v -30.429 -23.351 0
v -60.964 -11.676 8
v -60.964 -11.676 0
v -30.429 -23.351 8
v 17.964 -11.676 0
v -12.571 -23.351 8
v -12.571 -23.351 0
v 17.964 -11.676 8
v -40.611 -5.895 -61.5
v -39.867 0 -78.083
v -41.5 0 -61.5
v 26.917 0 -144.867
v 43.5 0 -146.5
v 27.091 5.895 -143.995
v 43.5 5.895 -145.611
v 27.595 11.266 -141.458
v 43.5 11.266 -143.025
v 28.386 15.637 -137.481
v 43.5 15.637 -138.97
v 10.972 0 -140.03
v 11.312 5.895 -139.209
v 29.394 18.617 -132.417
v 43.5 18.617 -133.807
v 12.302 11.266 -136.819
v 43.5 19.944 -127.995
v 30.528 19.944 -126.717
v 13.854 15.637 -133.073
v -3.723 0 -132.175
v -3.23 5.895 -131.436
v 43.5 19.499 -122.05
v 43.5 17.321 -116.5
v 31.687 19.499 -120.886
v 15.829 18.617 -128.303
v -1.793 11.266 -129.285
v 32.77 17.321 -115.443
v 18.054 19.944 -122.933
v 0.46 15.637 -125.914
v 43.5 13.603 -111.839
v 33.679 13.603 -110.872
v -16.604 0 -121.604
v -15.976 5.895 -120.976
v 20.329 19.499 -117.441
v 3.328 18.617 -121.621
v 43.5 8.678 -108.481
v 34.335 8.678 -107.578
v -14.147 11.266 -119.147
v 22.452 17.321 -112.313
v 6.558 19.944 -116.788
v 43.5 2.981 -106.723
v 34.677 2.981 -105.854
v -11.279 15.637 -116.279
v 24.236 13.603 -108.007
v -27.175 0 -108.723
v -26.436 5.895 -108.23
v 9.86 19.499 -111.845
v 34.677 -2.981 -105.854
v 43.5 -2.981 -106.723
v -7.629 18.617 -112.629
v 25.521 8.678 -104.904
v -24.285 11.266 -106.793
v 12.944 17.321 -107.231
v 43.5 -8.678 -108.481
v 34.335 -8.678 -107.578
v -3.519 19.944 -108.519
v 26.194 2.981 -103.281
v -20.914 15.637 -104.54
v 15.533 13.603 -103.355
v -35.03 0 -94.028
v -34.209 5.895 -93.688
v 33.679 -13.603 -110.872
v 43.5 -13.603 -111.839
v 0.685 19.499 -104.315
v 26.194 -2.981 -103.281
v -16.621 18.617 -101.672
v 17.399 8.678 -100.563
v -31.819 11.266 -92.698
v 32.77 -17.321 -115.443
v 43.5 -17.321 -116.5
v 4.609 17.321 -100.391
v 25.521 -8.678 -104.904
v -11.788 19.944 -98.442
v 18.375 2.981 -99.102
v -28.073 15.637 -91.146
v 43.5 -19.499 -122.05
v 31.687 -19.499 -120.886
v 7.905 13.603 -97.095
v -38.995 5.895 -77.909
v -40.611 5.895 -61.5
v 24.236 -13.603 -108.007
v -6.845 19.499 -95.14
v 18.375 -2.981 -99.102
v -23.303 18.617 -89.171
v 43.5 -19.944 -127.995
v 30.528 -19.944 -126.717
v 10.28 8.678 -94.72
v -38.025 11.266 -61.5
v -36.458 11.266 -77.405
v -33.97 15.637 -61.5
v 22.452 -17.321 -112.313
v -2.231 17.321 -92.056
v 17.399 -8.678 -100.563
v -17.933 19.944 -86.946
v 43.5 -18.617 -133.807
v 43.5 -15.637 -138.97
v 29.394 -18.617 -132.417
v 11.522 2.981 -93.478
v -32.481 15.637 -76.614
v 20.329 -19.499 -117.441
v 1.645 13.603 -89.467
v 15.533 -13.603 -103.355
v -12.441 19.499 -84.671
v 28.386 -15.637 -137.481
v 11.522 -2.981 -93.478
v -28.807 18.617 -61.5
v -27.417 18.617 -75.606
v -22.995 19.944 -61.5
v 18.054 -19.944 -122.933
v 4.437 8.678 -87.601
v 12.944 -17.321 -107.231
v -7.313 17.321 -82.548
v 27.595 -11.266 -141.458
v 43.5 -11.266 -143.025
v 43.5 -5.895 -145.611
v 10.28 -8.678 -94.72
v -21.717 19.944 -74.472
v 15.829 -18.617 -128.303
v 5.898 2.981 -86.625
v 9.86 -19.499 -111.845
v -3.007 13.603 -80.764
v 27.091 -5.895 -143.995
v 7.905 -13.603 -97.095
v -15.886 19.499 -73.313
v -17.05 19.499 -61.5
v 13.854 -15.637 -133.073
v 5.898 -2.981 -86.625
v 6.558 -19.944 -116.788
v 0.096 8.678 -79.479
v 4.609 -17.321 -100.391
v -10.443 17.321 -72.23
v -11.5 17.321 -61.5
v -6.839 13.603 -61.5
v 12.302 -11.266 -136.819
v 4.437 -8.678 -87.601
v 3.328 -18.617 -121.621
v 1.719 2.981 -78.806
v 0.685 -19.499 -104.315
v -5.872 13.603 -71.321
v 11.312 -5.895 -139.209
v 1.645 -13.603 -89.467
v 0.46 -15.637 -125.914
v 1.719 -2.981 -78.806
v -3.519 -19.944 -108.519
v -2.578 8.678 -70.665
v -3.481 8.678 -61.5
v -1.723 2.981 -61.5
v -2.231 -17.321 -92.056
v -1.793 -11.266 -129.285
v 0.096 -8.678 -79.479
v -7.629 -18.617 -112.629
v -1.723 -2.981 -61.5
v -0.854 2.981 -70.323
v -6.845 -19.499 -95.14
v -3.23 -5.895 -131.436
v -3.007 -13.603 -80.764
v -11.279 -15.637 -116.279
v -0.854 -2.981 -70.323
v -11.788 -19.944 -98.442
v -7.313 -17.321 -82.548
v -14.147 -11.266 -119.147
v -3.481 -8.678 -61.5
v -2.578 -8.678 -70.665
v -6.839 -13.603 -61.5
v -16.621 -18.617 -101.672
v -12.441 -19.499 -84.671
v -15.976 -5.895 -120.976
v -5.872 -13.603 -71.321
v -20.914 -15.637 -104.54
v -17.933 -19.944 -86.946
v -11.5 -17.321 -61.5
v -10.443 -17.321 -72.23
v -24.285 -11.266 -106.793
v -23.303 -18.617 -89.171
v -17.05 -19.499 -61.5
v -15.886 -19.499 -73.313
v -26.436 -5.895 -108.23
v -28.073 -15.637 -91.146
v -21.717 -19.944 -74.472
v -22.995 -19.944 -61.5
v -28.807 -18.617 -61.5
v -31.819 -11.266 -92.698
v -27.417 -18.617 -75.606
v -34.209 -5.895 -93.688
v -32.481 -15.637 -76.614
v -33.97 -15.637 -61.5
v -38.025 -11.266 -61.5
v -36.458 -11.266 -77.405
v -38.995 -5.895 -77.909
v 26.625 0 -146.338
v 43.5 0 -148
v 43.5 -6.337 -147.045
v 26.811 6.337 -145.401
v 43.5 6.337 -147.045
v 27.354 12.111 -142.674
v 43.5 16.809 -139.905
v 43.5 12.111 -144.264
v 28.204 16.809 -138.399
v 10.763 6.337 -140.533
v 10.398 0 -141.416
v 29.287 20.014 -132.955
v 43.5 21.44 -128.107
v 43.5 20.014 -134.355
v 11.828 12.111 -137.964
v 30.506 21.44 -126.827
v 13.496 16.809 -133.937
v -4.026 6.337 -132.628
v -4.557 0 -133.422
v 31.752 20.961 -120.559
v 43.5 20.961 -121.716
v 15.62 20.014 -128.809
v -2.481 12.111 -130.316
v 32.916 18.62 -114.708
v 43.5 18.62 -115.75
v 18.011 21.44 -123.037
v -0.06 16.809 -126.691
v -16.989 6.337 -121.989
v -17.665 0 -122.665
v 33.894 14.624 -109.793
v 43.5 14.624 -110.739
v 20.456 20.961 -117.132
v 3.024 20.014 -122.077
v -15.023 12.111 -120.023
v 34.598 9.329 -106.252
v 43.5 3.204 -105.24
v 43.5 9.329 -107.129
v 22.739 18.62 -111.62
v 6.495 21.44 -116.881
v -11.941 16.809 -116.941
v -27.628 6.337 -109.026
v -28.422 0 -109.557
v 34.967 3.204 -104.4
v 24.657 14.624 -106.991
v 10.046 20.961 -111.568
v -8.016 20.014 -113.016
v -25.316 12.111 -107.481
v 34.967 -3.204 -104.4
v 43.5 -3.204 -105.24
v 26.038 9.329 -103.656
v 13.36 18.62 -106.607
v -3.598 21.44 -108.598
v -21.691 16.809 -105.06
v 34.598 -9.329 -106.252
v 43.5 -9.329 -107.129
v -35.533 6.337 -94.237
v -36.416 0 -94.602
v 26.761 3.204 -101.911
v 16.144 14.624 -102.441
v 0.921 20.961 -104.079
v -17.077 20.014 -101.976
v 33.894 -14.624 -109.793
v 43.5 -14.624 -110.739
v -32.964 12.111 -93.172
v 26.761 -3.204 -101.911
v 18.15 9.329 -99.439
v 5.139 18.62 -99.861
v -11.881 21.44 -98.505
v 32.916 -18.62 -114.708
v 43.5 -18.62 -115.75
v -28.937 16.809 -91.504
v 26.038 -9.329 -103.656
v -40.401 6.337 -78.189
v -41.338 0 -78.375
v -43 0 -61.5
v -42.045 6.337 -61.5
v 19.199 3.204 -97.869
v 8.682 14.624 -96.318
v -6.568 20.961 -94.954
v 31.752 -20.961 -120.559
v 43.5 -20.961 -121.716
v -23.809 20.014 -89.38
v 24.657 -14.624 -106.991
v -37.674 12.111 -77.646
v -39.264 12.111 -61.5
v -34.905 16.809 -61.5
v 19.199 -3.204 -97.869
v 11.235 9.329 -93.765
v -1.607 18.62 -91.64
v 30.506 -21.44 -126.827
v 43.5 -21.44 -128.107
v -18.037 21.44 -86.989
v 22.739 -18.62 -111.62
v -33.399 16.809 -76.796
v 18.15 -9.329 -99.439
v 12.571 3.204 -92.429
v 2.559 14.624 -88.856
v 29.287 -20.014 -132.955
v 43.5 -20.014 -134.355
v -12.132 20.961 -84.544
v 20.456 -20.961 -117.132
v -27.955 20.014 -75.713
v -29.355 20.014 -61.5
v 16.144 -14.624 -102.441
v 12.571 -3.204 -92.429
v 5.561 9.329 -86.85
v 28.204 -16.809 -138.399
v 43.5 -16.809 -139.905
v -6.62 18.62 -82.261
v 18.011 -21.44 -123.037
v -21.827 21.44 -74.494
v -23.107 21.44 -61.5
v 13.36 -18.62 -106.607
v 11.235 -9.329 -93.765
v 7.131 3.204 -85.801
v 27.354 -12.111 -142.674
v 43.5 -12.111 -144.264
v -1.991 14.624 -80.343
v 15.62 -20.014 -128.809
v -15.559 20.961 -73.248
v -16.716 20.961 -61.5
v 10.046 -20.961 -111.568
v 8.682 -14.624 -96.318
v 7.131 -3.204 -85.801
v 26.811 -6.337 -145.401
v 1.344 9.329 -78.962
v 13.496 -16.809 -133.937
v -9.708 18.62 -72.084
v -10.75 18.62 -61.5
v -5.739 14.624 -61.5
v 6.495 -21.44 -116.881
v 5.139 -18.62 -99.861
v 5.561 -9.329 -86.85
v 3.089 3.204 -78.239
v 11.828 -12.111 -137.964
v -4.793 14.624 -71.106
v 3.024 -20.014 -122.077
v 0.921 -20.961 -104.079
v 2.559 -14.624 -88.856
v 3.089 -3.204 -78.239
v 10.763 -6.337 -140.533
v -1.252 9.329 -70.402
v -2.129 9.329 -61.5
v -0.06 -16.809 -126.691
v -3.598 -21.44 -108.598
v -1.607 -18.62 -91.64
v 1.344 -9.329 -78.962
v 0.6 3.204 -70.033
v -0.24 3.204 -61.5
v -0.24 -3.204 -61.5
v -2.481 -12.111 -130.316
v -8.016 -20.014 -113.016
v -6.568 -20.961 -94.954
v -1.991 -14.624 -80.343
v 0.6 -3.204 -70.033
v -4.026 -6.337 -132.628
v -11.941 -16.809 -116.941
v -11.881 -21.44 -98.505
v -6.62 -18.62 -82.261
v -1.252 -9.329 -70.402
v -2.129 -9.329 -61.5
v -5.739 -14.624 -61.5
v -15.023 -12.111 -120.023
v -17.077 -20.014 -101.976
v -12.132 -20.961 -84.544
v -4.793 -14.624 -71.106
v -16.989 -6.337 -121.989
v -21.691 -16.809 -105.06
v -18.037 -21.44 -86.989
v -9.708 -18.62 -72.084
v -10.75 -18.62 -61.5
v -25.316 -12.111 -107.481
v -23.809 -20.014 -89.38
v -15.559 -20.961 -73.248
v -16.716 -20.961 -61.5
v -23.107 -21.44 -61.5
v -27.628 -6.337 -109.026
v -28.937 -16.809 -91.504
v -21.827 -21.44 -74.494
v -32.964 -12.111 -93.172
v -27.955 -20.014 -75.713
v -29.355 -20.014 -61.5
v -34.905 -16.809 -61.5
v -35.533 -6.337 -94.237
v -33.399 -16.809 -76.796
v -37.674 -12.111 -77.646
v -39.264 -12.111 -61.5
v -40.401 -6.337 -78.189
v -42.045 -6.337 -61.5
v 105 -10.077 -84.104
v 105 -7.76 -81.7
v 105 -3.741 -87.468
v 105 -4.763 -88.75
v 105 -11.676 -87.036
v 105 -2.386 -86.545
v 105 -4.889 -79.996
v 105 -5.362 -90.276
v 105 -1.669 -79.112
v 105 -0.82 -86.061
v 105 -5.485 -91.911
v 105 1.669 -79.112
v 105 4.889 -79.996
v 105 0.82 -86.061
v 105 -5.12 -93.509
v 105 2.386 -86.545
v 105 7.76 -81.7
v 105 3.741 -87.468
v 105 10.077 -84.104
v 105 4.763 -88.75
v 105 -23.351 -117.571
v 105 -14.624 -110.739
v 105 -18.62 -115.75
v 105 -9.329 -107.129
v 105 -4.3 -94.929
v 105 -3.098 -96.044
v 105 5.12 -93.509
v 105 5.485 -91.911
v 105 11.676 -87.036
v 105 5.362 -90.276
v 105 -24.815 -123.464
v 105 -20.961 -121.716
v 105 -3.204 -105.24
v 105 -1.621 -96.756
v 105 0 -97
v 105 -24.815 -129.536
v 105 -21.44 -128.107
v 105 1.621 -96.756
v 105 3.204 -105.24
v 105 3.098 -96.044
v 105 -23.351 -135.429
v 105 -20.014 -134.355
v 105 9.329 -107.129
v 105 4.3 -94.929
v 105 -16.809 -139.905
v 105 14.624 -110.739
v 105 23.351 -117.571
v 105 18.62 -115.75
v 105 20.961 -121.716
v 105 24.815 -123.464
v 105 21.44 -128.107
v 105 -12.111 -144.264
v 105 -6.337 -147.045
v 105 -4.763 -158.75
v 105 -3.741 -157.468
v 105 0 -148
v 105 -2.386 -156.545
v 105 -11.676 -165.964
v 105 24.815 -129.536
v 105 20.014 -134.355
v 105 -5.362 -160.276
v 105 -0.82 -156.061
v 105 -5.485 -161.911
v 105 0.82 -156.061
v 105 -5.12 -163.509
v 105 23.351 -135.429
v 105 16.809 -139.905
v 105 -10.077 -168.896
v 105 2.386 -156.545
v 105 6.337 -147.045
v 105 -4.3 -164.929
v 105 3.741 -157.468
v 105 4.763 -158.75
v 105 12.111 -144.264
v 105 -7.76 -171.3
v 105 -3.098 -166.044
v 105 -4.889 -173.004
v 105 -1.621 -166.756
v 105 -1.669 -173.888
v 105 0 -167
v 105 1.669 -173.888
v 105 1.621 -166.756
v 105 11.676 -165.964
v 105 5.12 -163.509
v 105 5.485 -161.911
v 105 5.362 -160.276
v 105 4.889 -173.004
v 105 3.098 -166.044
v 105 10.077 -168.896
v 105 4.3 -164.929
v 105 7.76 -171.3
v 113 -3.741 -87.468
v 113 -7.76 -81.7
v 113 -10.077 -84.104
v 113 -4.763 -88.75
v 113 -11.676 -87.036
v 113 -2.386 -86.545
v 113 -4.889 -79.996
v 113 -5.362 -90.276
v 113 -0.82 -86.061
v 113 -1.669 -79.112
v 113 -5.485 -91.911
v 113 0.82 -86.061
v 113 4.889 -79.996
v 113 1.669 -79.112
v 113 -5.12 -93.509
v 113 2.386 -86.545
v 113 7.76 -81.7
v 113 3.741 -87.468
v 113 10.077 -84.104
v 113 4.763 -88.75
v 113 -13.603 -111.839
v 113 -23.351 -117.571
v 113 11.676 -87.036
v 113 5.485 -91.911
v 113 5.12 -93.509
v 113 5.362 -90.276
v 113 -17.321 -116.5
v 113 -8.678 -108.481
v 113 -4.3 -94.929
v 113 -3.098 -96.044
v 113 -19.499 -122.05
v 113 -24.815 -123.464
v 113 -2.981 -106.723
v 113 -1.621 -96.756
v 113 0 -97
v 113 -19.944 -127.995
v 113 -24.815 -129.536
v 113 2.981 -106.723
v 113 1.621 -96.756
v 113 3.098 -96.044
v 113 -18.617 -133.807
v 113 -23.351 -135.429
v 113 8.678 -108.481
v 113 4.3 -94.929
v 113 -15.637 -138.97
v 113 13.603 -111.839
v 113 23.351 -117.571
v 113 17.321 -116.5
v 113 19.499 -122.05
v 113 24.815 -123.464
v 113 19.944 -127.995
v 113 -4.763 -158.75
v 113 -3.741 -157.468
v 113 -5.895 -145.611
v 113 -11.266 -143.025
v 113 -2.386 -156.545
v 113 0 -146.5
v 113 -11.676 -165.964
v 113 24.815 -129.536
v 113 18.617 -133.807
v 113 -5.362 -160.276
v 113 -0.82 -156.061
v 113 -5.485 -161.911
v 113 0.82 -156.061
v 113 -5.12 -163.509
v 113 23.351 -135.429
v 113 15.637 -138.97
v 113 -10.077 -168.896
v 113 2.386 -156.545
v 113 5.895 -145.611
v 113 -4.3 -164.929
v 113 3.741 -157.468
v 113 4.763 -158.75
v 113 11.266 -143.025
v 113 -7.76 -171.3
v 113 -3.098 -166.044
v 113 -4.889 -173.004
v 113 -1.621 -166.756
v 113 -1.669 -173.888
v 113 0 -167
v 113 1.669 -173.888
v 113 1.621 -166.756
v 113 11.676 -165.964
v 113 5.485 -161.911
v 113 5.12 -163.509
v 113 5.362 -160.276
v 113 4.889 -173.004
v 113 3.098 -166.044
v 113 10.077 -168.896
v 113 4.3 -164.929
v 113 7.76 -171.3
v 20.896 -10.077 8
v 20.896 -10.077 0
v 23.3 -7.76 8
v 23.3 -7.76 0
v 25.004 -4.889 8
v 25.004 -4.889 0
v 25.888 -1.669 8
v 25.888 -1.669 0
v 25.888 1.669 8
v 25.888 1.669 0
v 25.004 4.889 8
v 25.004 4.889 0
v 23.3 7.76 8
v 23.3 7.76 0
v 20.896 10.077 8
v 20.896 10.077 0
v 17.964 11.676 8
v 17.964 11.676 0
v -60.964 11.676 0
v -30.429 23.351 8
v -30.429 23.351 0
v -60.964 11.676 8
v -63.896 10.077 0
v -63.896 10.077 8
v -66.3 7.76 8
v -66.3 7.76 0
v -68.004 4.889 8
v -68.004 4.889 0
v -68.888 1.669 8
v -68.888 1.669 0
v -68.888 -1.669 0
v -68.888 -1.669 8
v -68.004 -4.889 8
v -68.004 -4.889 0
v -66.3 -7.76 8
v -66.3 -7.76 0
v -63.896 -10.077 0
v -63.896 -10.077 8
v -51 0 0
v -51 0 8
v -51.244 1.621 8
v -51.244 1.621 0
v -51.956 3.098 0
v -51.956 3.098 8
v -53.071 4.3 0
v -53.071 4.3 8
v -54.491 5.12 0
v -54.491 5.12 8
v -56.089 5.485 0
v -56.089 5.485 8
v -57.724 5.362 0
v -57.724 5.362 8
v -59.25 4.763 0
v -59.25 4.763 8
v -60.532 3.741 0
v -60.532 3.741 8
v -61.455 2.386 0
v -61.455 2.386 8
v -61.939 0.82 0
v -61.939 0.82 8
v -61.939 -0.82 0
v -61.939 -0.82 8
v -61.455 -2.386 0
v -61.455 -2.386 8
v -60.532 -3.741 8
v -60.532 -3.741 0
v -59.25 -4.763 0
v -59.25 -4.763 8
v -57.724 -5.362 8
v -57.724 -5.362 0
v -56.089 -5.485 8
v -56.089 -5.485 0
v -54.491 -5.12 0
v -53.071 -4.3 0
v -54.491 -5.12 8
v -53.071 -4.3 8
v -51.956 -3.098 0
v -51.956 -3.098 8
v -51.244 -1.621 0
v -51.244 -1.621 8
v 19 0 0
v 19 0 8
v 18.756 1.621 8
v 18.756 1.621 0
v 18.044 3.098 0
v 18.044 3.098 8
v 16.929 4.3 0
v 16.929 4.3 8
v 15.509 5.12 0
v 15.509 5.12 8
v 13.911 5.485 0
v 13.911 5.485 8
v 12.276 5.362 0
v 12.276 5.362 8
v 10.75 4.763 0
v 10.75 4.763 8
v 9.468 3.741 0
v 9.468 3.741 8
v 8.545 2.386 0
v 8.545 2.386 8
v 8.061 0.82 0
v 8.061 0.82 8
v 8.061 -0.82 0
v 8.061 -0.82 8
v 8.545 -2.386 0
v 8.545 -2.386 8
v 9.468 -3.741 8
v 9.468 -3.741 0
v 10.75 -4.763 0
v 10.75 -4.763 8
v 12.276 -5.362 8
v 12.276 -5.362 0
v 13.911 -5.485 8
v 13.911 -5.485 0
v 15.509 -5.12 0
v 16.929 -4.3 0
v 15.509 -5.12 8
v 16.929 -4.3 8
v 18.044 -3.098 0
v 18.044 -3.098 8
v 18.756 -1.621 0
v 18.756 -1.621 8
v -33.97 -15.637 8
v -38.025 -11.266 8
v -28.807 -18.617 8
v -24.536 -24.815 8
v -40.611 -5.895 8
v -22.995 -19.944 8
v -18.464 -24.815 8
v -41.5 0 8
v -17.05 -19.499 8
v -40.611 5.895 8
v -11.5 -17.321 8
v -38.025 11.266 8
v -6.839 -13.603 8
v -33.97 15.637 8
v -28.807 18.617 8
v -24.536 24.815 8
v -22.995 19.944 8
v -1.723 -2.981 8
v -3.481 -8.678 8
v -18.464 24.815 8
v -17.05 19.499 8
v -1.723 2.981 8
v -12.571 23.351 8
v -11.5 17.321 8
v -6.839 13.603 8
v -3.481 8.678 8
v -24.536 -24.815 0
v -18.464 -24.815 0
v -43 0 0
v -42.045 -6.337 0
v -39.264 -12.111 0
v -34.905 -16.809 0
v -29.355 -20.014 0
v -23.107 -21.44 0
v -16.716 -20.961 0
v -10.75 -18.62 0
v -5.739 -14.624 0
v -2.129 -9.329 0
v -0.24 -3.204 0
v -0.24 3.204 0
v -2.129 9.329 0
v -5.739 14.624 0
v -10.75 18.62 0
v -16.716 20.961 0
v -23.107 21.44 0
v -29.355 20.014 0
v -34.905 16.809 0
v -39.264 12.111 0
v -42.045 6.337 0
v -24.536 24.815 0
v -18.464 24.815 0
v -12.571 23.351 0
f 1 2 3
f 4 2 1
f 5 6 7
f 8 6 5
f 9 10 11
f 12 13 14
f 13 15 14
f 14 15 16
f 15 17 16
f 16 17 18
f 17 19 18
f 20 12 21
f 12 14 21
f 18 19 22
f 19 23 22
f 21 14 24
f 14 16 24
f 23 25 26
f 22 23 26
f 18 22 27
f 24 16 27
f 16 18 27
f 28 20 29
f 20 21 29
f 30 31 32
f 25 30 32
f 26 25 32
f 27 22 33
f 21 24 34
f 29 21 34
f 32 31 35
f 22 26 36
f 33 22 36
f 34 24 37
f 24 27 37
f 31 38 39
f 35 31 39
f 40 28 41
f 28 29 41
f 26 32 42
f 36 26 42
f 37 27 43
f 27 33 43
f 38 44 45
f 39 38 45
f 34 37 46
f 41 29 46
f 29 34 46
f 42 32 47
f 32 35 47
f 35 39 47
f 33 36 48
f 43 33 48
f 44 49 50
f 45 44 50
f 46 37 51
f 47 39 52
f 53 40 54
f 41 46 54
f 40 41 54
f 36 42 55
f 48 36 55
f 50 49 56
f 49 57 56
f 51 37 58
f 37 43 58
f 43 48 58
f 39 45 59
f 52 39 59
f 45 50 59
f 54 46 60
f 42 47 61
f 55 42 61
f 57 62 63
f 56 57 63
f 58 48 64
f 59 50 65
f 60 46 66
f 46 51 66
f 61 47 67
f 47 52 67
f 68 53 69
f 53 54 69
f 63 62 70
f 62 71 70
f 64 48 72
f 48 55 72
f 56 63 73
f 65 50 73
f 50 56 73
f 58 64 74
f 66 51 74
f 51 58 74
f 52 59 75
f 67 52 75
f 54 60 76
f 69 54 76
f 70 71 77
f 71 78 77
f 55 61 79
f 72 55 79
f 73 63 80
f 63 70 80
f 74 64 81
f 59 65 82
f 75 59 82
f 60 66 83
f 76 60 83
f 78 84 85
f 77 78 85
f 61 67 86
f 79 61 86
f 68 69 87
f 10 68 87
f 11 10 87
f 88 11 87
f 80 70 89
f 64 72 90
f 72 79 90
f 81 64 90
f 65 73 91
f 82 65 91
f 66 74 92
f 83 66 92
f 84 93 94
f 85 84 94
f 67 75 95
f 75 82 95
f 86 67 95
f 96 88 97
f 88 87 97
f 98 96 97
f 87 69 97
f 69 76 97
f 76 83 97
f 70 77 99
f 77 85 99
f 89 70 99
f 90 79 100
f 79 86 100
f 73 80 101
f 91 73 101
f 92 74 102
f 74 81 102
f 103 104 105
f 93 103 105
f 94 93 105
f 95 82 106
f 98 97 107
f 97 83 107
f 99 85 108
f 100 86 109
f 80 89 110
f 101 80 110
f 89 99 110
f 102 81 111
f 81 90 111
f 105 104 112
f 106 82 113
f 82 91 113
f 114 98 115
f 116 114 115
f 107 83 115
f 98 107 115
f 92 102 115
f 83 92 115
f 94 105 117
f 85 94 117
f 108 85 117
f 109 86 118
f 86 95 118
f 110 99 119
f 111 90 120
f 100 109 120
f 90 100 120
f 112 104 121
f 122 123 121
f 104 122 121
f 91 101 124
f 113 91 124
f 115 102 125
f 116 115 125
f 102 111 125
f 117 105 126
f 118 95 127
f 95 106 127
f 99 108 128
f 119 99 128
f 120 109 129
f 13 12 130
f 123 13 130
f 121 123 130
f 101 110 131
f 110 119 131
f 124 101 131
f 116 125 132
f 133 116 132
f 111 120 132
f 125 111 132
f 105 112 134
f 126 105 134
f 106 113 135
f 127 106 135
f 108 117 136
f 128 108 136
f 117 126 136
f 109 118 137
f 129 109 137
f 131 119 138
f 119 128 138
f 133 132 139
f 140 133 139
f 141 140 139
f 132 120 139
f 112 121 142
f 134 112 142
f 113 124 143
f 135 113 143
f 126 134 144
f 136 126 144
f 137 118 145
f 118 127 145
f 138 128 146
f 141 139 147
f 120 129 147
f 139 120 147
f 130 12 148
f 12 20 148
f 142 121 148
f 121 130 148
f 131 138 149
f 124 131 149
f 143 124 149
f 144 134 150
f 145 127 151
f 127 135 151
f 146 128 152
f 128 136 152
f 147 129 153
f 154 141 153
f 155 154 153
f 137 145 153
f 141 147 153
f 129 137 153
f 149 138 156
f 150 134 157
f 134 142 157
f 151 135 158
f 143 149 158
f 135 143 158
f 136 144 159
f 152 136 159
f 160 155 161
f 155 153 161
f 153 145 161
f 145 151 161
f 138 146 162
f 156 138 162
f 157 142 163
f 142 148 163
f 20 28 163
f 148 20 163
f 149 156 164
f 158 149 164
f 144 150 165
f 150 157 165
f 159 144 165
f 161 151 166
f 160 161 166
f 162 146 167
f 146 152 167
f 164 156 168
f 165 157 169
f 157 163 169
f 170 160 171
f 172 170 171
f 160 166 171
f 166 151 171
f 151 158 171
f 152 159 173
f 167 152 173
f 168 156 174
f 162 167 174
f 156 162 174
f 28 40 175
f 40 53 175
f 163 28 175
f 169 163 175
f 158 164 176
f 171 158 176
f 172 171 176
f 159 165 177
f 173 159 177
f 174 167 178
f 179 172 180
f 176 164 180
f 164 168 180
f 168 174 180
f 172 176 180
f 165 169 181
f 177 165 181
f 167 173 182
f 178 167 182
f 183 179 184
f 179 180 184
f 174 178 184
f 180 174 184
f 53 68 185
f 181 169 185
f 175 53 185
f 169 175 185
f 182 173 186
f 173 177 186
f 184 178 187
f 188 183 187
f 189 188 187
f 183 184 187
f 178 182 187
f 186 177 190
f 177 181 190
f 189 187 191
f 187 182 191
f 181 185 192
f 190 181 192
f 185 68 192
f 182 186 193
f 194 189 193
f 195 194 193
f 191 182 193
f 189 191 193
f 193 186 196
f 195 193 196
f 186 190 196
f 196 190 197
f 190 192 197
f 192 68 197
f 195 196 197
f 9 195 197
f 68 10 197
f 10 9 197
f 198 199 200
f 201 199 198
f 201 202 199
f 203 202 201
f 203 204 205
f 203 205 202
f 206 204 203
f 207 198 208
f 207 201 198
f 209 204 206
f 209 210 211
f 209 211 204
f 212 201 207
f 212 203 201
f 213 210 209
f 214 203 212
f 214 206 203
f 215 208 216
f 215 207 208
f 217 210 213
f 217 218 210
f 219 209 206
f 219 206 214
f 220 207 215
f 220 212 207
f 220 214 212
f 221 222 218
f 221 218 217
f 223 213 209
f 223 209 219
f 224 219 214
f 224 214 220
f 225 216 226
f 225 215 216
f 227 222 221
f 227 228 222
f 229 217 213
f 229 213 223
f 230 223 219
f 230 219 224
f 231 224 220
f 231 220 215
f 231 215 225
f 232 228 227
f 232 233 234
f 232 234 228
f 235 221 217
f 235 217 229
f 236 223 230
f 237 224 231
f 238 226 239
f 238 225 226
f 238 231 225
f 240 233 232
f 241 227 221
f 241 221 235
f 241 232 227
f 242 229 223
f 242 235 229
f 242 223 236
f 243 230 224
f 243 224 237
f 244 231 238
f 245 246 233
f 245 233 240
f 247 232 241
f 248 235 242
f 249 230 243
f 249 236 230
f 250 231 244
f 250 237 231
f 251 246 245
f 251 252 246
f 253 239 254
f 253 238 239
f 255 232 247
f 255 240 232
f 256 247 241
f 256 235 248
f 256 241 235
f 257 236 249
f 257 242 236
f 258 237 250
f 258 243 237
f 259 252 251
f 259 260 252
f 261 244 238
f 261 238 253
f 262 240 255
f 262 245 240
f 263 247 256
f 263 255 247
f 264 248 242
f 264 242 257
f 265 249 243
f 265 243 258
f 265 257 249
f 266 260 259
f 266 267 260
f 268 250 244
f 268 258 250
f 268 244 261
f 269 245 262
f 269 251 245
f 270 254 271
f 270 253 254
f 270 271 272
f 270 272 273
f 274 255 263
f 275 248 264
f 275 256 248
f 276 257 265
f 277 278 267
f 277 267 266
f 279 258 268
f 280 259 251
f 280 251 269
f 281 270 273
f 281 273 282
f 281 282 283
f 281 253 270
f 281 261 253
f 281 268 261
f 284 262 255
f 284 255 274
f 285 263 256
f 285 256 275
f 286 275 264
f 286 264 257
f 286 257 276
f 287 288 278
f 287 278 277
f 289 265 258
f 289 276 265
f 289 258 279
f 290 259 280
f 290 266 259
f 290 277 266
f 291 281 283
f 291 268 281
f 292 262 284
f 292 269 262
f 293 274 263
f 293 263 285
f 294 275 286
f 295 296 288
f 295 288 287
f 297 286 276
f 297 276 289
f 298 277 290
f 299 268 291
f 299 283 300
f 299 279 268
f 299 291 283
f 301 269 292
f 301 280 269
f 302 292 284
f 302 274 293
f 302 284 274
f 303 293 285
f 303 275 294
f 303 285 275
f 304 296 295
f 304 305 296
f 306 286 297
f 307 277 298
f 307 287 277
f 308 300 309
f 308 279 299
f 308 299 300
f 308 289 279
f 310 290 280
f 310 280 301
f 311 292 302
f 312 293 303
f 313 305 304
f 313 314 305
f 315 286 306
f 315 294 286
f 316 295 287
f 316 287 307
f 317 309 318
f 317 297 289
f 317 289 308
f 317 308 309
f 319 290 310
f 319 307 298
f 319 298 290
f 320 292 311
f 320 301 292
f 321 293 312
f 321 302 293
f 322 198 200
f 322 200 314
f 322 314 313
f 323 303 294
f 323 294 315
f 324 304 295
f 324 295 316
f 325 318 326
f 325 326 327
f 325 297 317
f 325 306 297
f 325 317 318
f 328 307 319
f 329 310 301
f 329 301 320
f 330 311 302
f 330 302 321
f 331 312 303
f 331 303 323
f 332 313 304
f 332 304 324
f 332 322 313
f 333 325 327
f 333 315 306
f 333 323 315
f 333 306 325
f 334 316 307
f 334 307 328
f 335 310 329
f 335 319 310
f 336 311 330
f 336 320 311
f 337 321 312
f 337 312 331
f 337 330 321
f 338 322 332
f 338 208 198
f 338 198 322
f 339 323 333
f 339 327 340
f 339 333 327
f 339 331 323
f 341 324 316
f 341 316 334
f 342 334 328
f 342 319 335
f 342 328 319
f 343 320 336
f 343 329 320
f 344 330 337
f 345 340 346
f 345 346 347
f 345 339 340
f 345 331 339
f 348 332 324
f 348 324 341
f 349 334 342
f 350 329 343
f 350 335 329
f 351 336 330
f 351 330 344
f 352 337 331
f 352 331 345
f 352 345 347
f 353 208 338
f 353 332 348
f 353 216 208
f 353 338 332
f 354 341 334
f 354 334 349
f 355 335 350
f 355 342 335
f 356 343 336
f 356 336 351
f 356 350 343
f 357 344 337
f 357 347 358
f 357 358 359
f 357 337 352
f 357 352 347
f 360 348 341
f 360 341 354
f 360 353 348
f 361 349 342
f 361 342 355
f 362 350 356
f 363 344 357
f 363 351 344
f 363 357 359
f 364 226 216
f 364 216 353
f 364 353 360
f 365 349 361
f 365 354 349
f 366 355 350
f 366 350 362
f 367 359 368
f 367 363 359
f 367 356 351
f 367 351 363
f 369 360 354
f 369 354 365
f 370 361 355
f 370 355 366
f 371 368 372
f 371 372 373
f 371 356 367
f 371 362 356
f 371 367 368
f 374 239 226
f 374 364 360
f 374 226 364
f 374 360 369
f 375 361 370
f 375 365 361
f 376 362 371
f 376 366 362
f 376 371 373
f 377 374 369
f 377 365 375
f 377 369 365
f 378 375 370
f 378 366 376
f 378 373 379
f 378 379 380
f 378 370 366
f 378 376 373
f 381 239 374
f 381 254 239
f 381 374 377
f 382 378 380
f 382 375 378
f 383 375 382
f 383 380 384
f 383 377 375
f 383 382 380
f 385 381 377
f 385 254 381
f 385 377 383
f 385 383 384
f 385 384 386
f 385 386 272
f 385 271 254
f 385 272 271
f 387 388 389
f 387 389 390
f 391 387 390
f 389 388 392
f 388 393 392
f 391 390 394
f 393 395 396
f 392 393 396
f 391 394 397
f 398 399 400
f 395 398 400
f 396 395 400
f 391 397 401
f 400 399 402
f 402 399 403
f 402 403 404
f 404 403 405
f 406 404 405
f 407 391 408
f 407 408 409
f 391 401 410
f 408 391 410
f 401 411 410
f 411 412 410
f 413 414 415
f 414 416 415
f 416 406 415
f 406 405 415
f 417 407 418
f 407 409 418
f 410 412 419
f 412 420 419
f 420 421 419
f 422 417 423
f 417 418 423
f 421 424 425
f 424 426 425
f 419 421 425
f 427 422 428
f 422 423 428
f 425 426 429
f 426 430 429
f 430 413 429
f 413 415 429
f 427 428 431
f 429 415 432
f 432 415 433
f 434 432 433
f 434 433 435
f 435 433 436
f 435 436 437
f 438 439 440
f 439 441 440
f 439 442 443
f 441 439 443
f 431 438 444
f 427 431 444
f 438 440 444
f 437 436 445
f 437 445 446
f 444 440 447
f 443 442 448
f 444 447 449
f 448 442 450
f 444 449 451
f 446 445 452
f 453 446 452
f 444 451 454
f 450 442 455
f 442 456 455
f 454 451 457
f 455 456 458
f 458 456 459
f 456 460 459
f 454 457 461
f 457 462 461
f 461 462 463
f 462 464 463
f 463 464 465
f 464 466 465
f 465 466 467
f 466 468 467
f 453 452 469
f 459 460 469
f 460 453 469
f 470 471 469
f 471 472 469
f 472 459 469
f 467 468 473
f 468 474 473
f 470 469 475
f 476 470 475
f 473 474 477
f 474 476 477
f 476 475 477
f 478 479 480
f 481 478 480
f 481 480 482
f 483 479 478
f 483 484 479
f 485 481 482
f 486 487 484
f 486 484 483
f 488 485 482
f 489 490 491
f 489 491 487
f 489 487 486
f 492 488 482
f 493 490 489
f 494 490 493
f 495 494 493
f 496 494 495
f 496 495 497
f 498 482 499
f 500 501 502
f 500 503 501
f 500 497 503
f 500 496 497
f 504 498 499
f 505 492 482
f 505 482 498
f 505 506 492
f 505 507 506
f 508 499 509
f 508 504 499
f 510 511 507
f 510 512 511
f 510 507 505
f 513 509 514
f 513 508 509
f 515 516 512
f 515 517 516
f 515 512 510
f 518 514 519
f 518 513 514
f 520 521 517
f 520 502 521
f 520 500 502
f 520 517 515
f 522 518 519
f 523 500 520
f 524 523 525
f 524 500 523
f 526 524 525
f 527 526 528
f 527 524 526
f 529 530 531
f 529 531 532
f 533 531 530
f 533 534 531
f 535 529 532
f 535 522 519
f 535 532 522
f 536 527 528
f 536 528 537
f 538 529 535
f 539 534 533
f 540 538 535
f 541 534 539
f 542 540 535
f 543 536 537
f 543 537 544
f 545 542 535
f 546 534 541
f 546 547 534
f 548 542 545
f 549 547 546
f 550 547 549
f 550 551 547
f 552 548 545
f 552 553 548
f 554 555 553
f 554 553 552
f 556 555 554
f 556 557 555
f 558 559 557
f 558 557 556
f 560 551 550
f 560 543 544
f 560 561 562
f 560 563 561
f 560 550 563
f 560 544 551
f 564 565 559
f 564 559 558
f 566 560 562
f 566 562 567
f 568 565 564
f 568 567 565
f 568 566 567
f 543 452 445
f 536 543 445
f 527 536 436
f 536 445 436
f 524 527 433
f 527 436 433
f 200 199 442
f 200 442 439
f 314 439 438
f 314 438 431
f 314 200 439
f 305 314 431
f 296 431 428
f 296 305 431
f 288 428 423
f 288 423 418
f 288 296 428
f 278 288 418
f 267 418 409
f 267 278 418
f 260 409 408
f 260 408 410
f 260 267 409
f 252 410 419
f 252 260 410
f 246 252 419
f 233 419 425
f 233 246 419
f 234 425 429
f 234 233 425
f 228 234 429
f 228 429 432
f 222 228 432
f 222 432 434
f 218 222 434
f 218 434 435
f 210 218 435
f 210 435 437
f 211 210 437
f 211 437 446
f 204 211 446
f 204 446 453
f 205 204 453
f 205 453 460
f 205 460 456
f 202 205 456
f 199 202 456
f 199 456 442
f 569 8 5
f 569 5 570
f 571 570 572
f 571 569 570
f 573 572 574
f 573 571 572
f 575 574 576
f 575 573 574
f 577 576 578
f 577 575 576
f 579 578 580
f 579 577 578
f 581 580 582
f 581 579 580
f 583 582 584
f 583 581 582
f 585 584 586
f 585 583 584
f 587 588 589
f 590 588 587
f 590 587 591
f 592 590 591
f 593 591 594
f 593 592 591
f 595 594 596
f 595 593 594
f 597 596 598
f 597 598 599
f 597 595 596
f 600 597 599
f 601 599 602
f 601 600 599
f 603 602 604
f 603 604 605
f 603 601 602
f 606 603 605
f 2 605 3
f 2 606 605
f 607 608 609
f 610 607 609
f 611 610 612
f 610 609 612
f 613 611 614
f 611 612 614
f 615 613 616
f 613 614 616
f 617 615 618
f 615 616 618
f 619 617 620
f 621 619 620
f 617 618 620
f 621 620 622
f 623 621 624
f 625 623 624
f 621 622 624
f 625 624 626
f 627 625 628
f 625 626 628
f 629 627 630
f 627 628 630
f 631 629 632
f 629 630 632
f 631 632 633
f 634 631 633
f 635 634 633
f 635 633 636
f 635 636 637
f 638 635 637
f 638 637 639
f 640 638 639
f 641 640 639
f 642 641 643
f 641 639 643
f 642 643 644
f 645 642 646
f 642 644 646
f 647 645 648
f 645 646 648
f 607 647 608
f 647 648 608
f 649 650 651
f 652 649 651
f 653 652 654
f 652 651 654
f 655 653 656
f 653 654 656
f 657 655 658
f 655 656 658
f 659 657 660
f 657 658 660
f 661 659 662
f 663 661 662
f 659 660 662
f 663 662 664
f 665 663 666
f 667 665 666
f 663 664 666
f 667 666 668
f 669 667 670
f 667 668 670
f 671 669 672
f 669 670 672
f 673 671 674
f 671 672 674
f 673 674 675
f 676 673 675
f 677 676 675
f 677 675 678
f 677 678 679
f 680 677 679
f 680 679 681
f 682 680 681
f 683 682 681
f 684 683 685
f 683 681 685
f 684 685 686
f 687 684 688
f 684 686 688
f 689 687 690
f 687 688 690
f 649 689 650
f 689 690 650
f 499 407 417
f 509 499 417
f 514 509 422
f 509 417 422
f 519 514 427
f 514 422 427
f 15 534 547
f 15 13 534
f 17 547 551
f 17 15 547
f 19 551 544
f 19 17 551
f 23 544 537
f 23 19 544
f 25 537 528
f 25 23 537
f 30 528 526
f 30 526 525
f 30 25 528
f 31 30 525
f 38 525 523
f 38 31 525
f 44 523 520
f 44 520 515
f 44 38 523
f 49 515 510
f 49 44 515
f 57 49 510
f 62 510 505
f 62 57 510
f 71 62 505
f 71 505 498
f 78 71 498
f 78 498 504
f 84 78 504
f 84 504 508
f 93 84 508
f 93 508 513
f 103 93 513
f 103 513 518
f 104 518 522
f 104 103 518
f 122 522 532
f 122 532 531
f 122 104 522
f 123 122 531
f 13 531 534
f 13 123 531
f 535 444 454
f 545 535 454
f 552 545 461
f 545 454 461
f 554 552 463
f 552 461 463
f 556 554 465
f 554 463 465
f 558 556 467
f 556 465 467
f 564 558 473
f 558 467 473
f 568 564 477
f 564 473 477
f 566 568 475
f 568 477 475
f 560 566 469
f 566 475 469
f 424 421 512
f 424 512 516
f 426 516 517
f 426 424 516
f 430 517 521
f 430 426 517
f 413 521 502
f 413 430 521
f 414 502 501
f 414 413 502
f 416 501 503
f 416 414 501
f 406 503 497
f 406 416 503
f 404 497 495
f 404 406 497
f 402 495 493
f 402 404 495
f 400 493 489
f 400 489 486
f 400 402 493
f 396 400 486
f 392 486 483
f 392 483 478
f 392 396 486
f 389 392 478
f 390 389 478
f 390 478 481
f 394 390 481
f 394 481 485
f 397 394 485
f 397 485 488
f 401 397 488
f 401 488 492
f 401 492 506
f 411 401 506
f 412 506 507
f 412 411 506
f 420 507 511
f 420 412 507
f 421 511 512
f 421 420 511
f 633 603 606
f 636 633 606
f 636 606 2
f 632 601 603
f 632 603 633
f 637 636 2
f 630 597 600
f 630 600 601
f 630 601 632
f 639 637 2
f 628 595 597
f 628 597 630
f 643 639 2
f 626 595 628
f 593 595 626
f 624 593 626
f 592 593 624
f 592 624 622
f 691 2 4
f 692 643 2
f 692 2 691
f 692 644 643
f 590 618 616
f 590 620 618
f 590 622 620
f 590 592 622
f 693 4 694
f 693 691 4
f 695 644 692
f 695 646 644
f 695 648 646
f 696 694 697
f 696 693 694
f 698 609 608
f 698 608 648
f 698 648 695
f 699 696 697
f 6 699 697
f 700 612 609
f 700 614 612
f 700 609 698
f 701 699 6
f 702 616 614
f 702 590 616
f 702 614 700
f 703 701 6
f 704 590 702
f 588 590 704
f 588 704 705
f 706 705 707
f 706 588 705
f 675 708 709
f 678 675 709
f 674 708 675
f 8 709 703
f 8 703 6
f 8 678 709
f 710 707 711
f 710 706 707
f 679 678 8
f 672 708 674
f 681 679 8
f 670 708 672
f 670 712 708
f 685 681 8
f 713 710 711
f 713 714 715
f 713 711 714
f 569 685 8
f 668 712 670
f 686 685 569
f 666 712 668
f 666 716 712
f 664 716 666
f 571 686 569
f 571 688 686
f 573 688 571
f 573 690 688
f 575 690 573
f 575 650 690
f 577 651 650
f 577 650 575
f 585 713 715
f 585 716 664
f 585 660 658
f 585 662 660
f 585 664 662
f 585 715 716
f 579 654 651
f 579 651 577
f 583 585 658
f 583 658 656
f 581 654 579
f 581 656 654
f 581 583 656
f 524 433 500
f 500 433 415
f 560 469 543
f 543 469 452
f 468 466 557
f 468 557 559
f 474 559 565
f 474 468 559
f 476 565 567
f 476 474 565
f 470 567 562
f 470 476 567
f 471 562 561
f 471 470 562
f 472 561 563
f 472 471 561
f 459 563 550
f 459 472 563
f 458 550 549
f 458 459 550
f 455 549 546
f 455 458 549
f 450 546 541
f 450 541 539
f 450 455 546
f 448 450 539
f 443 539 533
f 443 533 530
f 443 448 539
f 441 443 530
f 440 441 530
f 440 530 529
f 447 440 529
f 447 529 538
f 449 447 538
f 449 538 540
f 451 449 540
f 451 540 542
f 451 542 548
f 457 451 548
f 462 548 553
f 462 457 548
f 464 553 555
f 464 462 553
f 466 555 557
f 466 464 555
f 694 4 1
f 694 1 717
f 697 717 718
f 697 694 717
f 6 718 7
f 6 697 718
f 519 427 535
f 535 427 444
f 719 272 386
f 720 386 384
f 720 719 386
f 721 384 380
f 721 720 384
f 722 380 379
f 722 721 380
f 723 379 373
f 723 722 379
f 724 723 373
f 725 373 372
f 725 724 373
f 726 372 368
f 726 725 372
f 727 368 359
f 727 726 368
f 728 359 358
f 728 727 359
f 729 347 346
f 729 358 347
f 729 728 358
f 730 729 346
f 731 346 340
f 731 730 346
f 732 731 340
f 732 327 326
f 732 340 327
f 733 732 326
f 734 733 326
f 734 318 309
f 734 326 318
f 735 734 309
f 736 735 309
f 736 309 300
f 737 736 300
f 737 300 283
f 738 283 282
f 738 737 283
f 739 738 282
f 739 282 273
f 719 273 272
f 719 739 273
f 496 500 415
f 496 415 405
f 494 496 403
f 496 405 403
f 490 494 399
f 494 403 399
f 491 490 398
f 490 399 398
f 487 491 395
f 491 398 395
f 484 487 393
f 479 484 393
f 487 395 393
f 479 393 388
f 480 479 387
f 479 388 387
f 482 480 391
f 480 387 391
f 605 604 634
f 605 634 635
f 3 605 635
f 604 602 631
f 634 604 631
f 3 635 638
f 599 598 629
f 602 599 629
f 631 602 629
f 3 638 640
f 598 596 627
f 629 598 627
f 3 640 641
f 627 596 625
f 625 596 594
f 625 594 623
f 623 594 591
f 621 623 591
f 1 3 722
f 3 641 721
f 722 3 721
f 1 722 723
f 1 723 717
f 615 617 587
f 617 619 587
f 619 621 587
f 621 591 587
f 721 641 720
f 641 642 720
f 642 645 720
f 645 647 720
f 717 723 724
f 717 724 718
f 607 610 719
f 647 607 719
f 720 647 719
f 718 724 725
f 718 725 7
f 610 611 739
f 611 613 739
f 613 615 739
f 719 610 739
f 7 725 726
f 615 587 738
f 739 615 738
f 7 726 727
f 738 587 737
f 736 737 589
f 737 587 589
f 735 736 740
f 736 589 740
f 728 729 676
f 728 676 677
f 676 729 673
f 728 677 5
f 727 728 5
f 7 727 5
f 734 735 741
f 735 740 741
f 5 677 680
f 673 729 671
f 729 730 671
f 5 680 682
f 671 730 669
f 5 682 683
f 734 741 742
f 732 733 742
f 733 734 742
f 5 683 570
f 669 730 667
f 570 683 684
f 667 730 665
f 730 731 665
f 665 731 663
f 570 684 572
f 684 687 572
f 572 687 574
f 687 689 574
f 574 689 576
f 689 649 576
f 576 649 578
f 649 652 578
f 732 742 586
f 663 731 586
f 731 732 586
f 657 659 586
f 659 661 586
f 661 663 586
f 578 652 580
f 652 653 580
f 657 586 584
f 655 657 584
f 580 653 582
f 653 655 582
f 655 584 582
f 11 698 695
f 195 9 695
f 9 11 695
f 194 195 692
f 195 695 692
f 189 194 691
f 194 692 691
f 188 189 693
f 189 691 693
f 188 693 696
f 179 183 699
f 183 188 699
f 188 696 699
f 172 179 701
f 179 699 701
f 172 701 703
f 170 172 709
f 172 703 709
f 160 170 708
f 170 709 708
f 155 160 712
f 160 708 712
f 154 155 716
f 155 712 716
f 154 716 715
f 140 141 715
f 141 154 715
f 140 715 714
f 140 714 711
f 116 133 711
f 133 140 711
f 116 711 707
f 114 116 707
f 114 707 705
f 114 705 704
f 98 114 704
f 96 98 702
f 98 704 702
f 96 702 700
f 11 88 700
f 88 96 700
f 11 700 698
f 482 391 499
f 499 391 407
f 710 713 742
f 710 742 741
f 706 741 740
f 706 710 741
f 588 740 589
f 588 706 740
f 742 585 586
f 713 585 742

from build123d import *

# Parameters (mm, degrees)
SWEEP3_PROFILE_R     = 21.5
CUT_SWEEP1_PROFILE_R = 20
SKETCH23_R           = 5.5
SKETCH23_R_2         = 20
BOSS_EXTRUDE2_DEPTH  = 8
BOSS_EXTRUDE3_START  = 8
SKETCH26_R           = 5.5
SKETCH26_R_2         = 20
BOSS_EXTRUDE3_DEPTH  = 8


with BuildPart() as part:
    # Sweep3: sweep along a path in Sketch1
    with BuildLine(Plane(origin=(0, 0, 0), x_dir=(1, 0, 0), z_dir=(0, 1, 0))) as sweep3_path:
        Line((105, 126.5), (43.5, 126.5))
        ThreePointArc((43.5, 126.5), (-2.461940777, 107.461940777), (-21.5, 61.5))
        Line((-21.5, 61.5), (-21.5, 0))
    # Sweep3 profile (on start of the path) → Sweep3 (sweep)
    with BuildSketch(Plane(origin=(105, 0, -126.5), x_dir=(0, 0, -1), z_dir=(-1, 0, 0))):
        Circle(SWEEP3_PROFILE_R)
    sweep(path=sweep3_path.line)

    # Cut-Sweep1: sweep along a path in Sketch1<5>
    with BuildLine(Plane(origin=(0, 0, 0), x_dir=(1, 0, 0), z_dir=(0, 1, 0))) as cut_sweep1_path:
        Line((105, 126.5), (43.5, 126.5))
        ThreePointArc((43.5, 126.5), (-2.461940777, 107.461940777), (-21.5, 61.5))
        Line((-21.5, 61.5), (-21.5, 0))
    # Cut-Sweep1 profile (on start of the path) → Cut-Sweep1 (sweep, cut)
    with BuildSketch(Plane(origin=(105, 0, -126.5), x_dir=(0, 0, -1), z_dir=(-1, 0, 0))):
        Circle(CUT_SWEEP1_PROFILE_R)
    sweep(path=cut_sweep1_path.line, mode=Mode.SUBTRACT)

    # Sketch23 → Boss-Extrude2 (add)
    with BuildSketch(Plane(origin=(105, 0, 0), x_dir=(0, 0, -1), z_dir=(1, 0, 0))):
        with BuildLine():
            Line((117.571428571, 23.35124434), (87.035714286, 11.67562217))
            ThreePointArc((87.035714286, 11.67562217), (79, 0), (87.035714286, -11.67562217))
            Line((87.035714286, -11.67562217), (117.571428571, -23.35124434))
            ThreePointArc((117.571428571, -23.35124434), (126.5, -25), (135.428571429, -23.35124434))
            Line((135.428571429, -23.35124434), (165.964285714, -11.67562217))
            ThreePointArc((165.964285714, -11.67562217), (174, 0), (165.964285714, 11.67562217))
            Line((165.964285714, 11.67562217), (135.428571429, 23.35124434))
            ThreePointArc((135.428571429, 23.35124434), (126.5, 25), (117.571428571, 23.35124434))
        make_face()
        with Locations((91.5, 0)):
            Circle(SKETCH23_R, mode=Mode.SUBTRACT)
        with Locations((161.5, 0)):
            Circle(SKETCH23_R, mode=Mode.SUBTRACT)
        with Locations((126.5, 0)):
            Circle(SKETCH23_R_2, mode=Mode.SUBTRACT)
    extrude(amount=BOSS_EXTRUDE2_DEPTH)

    # Sketch26 → Boss-Extrude3 (add)
    with BuildSketch(Plane.XY.offset(BOSS_EXTRUDE3_START)):
        with BuildLine():
            Line((-30.428571429, 23.35124434), (-60.964285714, 11.67562217))
            ThreePointArc((-60.964285714, 11.67562217), (-69, 0), (-60.964285714, -11.67562217))
            Line((-60.964285714, -11.67562217), (-30.428571429, -23.35124434))
            ThreePointArc((-30.428571429, -23.35124434), (-21.5, -25), (-12.571428571, -23.35124434))
            Line((-12.571428571, -23.35124434), (17.964285714, -11.67562217))
            ThreePointArc((17.964285714, -11.67562217), (26, 0), (17.964285714, 11.67562217))
            Line((17.964285714, 11.67562217), (-12.571428571, 23.35124434))
            ThreePointArc((-12.571428571, 23.35124434), (-21.5, 25), (-30.428571429, 23.35124434))
        make_face()
        with Locations((-56.5, 0)):
            Circle(SKETCH26_R, mode=Mode.SUBTRACT)
        with Locations((13.5, 0)):
            Circle(SKETCH26_R, mode=Mode.SUBTRACT)
        with Locations((-21.5, 0)):
            Circle(SKETCH26_R_2, mode=Mode.SUBTRACT)
    extrude(amount=-BOSS_EXTRUDE3_DEPTH)


solid = part.part
